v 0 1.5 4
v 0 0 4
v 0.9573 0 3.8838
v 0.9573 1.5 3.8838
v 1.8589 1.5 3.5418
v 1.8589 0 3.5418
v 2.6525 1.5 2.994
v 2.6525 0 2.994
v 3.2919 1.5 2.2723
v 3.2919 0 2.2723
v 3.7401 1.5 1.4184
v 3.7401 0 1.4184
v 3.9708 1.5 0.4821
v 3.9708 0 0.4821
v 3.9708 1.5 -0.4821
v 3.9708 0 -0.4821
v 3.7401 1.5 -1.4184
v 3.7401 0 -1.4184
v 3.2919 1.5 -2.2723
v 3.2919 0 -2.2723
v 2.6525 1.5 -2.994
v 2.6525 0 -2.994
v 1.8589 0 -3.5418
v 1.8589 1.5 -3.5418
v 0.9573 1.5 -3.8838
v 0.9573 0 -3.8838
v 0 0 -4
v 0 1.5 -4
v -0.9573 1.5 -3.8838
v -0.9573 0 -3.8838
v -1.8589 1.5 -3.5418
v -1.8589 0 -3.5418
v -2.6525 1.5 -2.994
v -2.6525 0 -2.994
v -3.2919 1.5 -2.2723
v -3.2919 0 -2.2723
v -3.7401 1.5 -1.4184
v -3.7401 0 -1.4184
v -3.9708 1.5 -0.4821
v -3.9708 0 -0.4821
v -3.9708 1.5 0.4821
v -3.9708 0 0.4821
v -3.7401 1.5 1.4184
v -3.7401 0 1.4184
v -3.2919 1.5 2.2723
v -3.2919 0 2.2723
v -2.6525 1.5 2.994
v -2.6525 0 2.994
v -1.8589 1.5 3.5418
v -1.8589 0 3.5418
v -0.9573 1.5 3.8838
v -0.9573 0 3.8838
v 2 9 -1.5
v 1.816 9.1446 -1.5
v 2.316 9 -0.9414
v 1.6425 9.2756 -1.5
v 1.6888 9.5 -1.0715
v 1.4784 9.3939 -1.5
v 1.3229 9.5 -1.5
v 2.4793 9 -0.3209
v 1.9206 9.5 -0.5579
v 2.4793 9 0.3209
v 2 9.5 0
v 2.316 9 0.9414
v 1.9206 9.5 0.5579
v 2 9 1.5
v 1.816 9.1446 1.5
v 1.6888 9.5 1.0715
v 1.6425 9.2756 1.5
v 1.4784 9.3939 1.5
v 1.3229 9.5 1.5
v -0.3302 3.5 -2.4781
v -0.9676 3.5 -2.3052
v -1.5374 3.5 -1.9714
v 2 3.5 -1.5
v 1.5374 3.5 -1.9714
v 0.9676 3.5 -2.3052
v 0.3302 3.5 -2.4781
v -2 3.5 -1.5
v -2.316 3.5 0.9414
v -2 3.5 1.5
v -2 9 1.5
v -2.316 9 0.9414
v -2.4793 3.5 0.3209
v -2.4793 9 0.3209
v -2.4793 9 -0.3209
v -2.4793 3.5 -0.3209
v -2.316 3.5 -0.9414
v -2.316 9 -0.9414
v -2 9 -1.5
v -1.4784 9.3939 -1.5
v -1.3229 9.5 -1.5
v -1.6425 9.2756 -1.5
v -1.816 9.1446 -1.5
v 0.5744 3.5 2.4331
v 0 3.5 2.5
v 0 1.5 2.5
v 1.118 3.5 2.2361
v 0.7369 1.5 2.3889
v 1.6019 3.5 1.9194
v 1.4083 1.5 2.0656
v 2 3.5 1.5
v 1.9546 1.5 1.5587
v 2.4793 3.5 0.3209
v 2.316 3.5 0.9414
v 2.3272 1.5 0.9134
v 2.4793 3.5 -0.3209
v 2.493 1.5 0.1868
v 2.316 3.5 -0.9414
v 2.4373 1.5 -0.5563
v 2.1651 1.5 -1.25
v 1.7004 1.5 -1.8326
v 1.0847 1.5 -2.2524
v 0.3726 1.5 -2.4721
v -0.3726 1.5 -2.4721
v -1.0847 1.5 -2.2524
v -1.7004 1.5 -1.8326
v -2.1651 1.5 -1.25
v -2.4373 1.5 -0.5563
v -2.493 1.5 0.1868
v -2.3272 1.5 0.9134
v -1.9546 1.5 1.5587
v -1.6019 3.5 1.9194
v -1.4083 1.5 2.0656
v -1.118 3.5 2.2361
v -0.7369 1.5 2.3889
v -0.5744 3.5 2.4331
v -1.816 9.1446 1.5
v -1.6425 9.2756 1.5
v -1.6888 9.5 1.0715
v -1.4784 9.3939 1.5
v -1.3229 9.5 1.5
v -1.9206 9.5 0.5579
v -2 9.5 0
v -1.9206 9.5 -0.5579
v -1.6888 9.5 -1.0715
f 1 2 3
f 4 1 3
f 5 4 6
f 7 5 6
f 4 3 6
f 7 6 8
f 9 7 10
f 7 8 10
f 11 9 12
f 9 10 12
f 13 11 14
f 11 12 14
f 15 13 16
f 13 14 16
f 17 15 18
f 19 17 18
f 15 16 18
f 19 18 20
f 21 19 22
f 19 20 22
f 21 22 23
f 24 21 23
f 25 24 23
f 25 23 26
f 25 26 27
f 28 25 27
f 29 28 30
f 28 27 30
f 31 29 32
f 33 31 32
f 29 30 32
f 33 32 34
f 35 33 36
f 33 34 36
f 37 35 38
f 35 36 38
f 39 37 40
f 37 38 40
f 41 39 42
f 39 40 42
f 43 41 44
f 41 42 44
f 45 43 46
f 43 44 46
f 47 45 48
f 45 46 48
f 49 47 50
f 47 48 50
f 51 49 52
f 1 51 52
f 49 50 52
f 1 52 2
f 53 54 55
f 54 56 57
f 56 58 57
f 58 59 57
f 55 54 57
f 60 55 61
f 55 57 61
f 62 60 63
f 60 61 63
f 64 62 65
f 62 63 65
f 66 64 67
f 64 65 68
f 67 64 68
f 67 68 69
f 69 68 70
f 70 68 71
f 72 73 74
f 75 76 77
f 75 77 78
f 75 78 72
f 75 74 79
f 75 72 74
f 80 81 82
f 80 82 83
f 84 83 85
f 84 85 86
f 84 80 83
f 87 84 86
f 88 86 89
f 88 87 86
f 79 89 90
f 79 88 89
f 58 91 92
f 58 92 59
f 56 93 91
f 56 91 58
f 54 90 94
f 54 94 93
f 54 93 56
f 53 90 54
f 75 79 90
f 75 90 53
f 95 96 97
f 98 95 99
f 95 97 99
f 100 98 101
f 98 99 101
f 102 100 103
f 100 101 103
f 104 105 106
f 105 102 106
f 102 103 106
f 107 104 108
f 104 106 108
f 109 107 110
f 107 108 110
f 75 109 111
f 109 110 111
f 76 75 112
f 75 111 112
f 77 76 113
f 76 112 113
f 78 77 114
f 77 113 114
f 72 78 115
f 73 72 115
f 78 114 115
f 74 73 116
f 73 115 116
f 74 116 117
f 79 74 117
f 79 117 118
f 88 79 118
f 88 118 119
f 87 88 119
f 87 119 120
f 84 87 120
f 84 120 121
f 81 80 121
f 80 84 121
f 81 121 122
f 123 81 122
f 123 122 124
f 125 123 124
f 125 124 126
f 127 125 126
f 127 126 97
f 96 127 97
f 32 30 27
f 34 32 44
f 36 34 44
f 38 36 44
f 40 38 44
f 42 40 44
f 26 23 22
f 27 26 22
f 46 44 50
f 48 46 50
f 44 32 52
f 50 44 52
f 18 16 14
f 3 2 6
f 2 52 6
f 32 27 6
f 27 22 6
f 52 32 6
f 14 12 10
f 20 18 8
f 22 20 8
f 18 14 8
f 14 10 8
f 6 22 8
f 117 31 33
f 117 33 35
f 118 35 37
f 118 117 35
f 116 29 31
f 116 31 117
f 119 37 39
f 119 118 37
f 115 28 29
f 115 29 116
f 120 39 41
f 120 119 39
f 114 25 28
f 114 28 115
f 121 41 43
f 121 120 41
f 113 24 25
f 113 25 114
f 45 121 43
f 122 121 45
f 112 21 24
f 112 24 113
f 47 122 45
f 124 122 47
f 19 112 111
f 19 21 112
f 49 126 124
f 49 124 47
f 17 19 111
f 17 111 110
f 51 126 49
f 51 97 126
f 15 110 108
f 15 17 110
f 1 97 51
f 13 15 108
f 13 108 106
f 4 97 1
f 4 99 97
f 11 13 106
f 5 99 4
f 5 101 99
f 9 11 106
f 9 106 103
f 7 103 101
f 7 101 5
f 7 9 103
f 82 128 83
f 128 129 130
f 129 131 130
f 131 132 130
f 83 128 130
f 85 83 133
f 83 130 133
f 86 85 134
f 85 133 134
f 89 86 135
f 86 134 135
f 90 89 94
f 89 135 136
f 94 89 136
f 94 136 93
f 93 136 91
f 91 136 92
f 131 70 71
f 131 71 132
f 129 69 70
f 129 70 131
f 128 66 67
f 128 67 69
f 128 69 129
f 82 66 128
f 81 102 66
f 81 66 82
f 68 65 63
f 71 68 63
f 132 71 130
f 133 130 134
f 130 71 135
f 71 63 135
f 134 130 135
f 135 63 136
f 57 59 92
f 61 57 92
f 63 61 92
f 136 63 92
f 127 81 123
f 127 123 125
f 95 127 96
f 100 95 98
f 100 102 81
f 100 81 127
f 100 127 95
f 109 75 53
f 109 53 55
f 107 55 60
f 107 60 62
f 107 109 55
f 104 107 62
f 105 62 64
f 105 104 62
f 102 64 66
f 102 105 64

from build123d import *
from build123d.topology import SkipClean

# Parameters (mm, degrees)
SKETCH_1_R      = 4
EXTRUDE_1_DEPTH = 1.5
SKETCH_3_R      = 2.5
EXTRUDE_3_DEPTH = 2
EXTRUDE_2_DEPTH = 6
CHAMFER_1_SIZE  = 0.5


with BuildPart() as part:
    # 草图1 → 凸台-拉伸1 (new body)
    with BuildSketch(Plane(origin=(0, 0, 0), x_dir=(1, 0, 0), z_dir=(0, 1, 0))):
        with Locations(Location((0, 0, 0), (0, 0, 270))):
            Circle(SKETCH_1_R)
    extrude(amount=EXTRUDE_1_DEPTH)

    # 草图3 → 凸台-拉伸3 (add)
    with BuildSketch(Plane(origin=(0, 1.5, 0), x_dir=(1, 0, 0), z_dir=(0, 1, 0))):
        with Locations(Location((0, 0, 0), (0, 0, 270))):
            Circle(SKETCH_3_R)
    extrude(amount=EXTRUDE_3_DEPTH)

    # 草图2 → 凸台-拉伸2 (add)
    with SkipClean():  # the faces are left unmerged after this step: merging them gives an invalid solid
        with BuildSketch(Plane(origin=(0, 3.5, 0), x_dir=(1, 0, 0), z_dir=(0, 1, 0))):
            with BuildLine():
                Line((-2, 1.5), (2, 1.5))
                ThreePointArc((2, 1.5), (2.5, 0), (2, -1.5))
                Line((2, -1.5), (-2, -1.5))
                ThreePointArc((-2, -1.5), (-2.5, 0), (-2, 1.5))
            make_face()
        extrude(amount=EXTRUDE_2_DEPTH)

    # 倒角1
    chamfer_1_edges = [part.edges().sort_by_distance(p)[0] for p in [
        (-2.5, 9.5, 0),
        (2.5, 9.5, 0),
    ]]
    chamfer(chamfer_1_edges, length=CHAMFER_1_SIZE)


solid = part.part
